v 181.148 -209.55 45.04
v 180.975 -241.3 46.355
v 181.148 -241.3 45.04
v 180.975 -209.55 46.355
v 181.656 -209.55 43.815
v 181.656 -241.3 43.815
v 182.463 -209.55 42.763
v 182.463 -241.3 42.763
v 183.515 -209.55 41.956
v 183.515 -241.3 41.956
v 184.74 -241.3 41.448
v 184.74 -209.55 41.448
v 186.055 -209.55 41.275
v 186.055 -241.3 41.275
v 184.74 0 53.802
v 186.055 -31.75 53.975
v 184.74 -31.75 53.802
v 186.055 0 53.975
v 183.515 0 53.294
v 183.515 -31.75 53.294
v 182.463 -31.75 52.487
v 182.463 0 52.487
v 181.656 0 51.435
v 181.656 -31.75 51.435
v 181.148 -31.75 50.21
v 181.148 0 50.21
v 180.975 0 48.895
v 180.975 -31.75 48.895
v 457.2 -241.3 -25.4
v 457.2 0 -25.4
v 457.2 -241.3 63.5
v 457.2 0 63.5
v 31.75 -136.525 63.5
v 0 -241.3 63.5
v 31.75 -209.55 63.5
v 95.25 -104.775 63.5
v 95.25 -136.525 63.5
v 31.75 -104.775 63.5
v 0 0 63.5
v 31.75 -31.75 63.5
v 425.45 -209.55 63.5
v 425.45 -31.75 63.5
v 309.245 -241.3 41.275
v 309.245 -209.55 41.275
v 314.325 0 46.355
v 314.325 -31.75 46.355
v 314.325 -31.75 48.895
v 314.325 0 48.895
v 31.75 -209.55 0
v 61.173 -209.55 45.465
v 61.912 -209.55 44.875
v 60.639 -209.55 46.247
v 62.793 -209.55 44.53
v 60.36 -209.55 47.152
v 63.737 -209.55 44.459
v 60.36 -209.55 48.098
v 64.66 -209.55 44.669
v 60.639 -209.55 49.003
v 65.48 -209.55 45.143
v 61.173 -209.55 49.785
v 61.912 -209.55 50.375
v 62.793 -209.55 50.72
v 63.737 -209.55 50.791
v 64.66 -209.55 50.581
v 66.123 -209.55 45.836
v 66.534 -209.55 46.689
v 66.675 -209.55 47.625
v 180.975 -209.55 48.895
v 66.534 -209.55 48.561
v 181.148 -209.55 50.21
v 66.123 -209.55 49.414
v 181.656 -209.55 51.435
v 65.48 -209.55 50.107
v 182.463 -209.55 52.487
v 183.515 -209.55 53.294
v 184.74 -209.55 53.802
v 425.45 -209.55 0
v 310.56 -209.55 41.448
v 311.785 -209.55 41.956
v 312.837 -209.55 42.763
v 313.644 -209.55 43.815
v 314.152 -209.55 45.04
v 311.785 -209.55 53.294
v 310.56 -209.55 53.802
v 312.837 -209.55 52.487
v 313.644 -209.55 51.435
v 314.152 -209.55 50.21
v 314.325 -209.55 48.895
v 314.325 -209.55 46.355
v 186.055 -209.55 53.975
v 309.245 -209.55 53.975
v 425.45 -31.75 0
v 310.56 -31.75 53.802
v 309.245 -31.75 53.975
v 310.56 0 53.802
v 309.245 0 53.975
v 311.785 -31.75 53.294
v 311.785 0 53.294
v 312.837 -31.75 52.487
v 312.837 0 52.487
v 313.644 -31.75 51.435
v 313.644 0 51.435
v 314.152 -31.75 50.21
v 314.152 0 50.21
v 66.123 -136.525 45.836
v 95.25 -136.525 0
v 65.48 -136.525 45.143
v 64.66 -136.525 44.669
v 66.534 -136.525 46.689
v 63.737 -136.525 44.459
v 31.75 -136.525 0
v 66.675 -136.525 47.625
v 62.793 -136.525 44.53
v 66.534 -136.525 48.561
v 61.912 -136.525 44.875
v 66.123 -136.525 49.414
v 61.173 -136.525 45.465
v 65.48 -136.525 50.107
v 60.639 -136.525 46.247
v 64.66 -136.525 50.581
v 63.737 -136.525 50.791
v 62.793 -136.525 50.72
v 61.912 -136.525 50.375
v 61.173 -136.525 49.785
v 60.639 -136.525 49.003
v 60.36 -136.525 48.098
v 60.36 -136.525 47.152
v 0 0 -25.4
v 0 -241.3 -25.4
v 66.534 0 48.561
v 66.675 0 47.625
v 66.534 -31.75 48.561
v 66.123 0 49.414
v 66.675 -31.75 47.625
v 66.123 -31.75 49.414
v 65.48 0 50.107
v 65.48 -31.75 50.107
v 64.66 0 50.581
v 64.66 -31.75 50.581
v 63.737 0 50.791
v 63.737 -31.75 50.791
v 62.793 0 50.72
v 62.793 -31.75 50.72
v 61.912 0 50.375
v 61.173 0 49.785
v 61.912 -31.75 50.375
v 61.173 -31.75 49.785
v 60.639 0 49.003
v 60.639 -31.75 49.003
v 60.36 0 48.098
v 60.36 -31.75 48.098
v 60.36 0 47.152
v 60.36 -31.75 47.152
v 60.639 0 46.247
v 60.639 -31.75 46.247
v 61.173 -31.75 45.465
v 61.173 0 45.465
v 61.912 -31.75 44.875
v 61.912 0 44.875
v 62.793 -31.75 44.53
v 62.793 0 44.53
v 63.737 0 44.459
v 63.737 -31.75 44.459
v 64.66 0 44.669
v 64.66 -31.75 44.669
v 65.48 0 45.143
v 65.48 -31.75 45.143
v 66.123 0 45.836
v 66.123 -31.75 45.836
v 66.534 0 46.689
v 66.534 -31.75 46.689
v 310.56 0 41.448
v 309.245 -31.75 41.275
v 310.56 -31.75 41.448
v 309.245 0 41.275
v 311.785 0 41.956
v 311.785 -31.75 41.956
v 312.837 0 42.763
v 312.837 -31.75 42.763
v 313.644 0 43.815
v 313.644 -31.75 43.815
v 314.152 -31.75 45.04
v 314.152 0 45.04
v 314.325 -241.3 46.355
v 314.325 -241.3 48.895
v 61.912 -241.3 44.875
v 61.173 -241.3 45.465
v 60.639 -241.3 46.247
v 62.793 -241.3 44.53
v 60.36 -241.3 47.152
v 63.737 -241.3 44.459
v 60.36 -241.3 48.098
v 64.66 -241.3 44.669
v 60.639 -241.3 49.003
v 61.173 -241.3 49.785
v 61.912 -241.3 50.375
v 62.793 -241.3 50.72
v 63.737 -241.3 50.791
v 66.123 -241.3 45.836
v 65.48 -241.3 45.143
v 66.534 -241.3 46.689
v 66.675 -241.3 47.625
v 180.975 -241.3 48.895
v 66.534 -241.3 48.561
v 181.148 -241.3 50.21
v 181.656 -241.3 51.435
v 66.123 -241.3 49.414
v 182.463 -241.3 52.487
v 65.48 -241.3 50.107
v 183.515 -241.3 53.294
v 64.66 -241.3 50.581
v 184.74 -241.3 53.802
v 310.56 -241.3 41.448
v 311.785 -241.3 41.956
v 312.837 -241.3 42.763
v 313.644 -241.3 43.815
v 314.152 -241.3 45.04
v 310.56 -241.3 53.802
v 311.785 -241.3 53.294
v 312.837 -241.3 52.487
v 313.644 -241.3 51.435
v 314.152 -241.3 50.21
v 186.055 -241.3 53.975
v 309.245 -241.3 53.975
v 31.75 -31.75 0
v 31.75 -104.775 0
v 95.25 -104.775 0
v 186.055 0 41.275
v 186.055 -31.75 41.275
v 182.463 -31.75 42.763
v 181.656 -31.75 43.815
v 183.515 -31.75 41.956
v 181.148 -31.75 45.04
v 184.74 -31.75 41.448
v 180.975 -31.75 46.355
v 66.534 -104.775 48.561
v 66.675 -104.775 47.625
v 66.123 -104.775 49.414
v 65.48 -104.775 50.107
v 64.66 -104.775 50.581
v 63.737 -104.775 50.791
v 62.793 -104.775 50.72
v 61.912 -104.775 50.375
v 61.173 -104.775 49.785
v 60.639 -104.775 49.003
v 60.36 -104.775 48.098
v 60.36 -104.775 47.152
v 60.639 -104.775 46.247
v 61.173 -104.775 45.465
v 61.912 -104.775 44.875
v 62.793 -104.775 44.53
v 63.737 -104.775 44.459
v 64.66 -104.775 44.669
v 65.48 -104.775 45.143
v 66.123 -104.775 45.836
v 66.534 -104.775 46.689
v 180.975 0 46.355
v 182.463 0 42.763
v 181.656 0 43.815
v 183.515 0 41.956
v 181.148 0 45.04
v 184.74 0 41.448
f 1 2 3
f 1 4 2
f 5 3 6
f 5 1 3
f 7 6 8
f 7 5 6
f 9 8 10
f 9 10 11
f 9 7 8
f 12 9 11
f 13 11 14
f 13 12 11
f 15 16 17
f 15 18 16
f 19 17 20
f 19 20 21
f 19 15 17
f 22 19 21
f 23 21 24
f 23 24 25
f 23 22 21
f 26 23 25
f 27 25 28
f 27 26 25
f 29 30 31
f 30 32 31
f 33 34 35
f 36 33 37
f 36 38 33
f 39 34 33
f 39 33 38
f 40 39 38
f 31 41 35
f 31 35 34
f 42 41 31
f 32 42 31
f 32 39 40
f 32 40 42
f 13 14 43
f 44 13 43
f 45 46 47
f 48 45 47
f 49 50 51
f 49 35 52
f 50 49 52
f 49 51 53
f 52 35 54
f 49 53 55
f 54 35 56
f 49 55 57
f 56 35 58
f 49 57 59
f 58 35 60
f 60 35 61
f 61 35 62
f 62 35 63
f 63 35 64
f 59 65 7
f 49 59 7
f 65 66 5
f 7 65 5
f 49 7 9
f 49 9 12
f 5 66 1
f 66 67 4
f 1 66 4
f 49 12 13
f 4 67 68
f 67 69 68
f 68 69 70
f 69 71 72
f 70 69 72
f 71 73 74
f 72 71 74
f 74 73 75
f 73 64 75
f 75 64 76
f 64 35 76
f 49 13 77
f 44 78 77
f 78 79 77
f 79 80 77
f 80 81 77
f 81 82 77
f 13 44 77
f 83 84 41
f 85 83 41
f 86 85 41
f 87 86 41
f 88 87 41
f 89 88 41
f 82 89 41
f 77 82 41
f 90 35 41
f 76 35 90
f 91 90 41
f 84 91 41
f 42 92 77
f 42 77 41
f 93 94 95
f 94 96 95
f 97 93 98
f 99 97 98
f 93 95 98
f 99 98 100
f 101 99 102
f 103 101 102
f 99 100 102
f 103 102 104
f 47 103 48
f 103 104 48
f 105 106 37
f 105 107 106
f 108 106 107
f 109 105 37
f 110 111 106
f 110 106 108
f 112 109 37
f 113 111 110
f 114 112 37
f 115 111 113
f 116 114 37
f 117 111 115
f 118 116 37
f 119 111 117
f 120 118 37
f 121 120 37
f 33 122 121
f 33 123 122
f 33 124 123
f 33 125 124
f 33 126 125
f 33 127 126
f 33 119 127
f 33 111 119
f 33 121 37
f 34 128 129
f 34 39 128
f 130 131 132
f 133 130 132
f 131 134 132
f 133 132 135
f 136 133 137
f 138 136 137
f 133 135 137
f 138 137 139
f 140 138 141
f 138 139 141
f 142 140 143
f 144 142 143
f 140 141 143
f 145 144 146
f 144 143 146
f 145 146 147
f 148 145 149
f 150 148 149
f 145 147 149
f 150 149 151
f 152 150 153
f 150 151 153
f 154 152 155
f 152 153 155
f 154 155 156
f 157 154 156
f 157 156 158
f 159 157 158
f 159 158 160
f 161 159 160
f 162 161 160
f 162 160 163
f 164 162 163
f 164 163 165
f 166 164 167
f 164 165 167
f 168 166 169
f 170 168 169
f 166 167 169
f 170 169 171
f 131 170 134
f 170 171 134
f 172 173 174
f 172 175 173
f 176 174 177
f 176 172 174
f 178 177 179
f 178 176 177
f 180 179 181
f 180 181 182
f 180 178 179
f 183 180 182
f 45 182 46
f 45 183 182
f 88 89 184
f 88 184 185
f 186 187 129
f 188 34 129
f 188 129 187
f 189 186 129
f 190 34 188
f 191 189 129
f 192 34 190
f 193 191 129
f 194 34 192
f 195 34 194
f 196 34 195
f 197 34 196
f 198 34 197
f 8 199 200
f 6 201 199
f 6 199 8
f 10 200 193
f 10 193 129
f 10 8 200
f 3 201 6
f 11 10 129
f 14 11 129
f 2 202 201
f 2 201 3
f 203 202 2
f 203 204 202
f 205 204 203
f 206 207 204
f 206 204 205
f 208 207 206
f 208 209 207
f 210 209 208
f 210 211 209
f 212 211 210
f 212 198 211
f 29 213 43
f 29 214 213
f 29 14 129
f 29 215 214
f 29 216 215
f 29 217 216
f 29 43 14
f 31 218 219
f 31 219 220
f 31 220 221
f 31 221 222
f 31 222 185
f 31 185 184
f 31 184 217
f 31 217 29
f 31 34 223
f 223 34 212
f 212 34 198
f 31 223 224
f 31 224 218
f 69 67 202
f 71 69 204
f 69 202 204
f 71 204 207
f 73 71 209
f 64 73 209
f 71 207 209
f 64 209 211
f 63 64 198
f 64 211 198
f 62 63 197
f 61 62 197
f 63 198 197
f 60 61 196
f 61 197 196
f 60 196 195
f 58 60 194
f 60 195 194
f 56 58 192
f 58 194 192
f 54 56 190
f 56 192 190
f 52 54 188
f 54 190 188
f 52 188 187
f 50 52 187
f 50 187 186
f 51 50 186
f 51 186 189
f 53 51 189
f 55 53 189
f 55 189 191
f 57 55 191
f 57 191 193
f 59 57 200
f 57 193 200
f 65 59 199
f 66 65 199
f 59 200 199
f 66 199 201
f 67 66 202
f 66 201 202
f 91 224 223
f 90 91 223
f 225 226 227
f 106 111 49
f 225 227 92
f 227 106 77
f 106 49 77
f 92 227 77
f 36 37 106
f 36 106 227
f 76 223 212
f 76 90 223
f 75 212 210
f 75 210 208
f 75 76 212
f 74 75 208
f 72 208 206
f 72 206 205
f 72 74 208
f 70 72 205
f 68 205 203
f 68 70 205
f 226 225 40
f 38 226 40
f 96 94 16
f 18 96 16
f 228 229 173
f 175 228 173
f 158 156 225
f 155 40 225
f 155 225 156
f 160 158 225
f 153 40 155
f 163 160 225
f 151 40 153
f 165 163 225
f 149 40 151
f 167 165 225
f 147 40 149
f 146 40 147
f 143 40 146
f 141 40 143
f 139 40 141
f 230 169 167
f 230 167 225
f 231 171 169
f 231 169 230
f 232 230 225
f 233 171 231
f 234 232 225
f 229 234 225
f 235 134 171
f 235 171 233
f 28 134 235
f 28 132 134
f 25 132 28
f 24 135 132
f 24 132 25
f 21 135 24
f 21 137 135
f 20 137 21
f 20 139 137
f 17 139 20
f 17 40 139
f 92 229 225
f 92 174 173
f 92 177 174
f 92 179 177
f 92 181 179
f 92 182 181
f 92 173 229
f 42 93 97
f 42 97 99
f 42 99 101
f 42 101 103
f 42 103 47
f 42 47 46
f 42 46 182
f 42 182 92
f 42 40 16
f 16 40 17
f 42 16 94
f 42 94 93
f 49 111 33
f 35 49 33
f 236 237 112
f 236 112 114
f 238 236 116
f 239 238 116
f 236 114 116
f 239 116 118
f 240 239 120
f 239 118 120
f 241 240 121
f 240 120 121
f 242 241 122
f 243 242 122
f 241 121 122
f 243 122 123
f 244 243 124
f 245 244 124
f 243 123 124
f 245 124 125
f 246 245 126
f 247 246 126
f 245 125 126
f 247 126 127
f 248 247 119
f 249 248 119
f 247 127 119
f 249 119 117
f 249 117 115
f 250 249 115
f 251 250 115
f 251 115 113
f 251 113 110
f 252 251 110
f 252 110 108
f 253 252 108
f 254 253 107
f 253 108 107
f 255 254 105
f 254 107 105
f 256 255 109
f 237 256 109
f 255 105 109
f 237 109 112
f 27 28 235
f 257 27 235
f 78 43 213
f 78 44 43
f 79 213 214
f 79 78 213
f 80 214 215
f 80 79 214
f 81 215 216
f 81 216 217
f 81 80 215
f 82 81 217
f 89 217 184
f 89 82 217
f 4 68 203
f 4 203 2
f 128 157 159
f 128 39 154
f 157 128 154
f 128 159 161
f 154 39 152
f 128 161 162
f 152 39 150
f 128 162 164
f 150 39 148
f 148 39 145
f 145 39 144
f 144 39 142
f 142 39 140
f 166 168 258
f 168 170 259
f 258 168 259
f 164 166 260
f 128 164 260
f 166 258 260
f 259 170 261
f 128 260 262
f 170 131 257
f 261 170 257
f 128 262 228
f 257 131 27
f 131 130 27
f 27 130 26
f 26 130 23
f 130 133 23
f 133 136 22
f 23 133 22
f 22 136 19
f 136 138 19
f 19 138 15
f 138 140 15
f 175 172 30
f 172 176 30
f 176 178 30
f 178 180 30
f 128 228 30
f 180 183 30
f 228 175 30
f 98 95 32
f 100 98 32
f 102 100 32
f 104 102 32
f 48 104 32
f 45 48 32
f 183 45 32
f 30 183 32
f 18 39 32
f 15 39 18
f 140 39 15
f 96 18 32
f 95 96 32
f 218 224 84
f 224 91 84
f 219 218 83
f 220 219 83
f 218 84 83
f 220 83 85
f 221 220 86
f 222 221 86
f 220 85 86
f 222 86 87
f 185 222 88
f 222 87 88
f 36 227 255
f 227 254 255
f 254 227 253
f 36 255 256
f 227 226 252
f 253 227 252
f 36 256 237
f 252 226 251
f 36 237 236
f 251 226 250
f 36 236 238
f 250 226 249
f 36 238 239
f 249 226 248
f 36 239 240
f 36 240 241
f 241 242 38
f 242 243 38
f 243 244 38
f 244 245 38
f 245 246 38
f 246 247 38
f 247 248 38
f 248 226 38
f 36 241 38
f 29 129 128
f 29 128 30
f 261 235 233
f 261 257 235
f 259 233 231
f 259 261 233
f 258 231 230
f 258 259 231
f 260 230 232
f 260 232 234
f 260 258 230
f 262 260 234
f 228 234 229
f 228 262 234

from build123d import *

# Parameters (mm, degrees)
F0_W      = 457.2
F0_H      = 63.5
F1_DEPTH  = 31.75
F2_W      = 31.75
F2_H      = 63.5
F3_DEPTH  = 177.8
F4_W      = 31.75
F4_H      = 63.5
F4_W_2    = 425.45
F5_DEPTH  = 31.75
F6_W      = 31.75
F6_H      = 63.5
F7_DEPTH  = 177.8
F8_W      = 15.875
F8_H      = 63.5
F9_DEPTH  = 63.5
F10_R     = 3.175
F11_DEPTH = 190.5
F12_W     = 457.2
F12_H     = 241.3
F13_DEPTH = 25.4
F15_DEPTH = 254
F16_R     = 5.08


with BuildPart() as f1:
    # F0 (on Front) → F1 (new body)
    with BuildSketch(Plane.XZ):
        with Locations((228.6, 31.75)):
            Rectangle(F0_W, F0_H)
    extrude(amount=F1_DEPTH)

    # F2 (on face) → F3 (join)
    with BuildSketch(Plane.XZ.offset(31.75)):
        with Locations((441.325, 31.75)):
            Rectangle(F2_W, F2_H)
    extrude(amount=F3_DEPTH)

    # F4 (on face) → F5 (join)
    with BuildSketch(Plane.XZ.offset(209.55)):
        with Locations((441.325, 31.75)):
            Rectangle(F4_W, F4_H)
        with Locations((212.725, 31.75)):
            Rectangle(F4_W_2, F4_H)
    extrude(amount=F5_DEPTH)

    # F6 (on face) → F7 (join)
    with BuildSketch(Plane.XZ.offset(31.75)):
        with Locations((15.875, 31.75)):
            Rectangle(F6_W, F6_H)
    extrude(amount=F7_DEPTH)

    # F8 (on face) → F9 (join)
    with BuildSketch(Plane.YZ.offset(31.75)):
        with Locations((-128.5875, 31.75)):
            Rectangle(F8_W, F8_H)
        with Locations((-112.7125, 31.75)):
            Rectangle(F8_W, F8_H)
    extrude(amount=F9_DEPTH)

    # F10 (on face) → F11 (cut, symmetric)
    with BuildSketch(Plane.XZ.offset(136.525)):
        with Locations((63.5, 47.625)):
            Circle(F10_R)
    extrude(amount=F11_DEPTH, both=True, mode=Mode.SUBTRACT)

    # F12 (on face) → F13 (join)
    with BuildSketch(Plane(origin=(0, 0, 0), x_dir=(1, 0, 0), z_dir=(0, 0, -1))):
        with Locations((228.6, 120.65)):
            Rectangle(F12_W, F12_H)
        Polygon((425.45, 209.55), (425.45, 31.75), (31.75, 31.75), (31.75, 104.775), (95.25, 104.775), (95.25, 136.525), (31.75, 136.525), (31.75, 209.55), align=None, mode=Mode.SUBTRACT)
        Polygon((31.75, 31.75), (425.45, 31.75), (425.45, 209.55), (31.75, 209.55), (31.75, 136.525), (95.25, 136.525), (95.25, 104.775), (31.75, 104.775), align=None)
    extrude(amount=F13_DEPTH)

    # F14 (on face) → F15 (cut)
    with BuildSketch(Plane.XZ.offset(241.3)):
        Polygon((314.325, 53.975), (247.65, 53.975), (180.975, 53.975), (180.975, 41.275), (314.325, 41.275), align=None)
    extrude(amount=-F15_DEPTH, mode=Mode.SUBTRACT)

    # F16
    f16_edges = [f1.edges().sort_by_distance(p)[0] for p in [
        (180.975, -225.425, 41.275),
        (180.975, -225.425, 53.975),
        (314.325, -225.425, 41.275),
        (314.325, -225.425, 53.975),
        (180.975, -15.875, 41.275),
        (180.975, -15.875, 53.975),
        (314.325, -15.875, 41.275),
        (314.325, -15.875, 53.975),
    ]]
    fillet(f16_edges, radius=F16_R)


solid = f1.part
